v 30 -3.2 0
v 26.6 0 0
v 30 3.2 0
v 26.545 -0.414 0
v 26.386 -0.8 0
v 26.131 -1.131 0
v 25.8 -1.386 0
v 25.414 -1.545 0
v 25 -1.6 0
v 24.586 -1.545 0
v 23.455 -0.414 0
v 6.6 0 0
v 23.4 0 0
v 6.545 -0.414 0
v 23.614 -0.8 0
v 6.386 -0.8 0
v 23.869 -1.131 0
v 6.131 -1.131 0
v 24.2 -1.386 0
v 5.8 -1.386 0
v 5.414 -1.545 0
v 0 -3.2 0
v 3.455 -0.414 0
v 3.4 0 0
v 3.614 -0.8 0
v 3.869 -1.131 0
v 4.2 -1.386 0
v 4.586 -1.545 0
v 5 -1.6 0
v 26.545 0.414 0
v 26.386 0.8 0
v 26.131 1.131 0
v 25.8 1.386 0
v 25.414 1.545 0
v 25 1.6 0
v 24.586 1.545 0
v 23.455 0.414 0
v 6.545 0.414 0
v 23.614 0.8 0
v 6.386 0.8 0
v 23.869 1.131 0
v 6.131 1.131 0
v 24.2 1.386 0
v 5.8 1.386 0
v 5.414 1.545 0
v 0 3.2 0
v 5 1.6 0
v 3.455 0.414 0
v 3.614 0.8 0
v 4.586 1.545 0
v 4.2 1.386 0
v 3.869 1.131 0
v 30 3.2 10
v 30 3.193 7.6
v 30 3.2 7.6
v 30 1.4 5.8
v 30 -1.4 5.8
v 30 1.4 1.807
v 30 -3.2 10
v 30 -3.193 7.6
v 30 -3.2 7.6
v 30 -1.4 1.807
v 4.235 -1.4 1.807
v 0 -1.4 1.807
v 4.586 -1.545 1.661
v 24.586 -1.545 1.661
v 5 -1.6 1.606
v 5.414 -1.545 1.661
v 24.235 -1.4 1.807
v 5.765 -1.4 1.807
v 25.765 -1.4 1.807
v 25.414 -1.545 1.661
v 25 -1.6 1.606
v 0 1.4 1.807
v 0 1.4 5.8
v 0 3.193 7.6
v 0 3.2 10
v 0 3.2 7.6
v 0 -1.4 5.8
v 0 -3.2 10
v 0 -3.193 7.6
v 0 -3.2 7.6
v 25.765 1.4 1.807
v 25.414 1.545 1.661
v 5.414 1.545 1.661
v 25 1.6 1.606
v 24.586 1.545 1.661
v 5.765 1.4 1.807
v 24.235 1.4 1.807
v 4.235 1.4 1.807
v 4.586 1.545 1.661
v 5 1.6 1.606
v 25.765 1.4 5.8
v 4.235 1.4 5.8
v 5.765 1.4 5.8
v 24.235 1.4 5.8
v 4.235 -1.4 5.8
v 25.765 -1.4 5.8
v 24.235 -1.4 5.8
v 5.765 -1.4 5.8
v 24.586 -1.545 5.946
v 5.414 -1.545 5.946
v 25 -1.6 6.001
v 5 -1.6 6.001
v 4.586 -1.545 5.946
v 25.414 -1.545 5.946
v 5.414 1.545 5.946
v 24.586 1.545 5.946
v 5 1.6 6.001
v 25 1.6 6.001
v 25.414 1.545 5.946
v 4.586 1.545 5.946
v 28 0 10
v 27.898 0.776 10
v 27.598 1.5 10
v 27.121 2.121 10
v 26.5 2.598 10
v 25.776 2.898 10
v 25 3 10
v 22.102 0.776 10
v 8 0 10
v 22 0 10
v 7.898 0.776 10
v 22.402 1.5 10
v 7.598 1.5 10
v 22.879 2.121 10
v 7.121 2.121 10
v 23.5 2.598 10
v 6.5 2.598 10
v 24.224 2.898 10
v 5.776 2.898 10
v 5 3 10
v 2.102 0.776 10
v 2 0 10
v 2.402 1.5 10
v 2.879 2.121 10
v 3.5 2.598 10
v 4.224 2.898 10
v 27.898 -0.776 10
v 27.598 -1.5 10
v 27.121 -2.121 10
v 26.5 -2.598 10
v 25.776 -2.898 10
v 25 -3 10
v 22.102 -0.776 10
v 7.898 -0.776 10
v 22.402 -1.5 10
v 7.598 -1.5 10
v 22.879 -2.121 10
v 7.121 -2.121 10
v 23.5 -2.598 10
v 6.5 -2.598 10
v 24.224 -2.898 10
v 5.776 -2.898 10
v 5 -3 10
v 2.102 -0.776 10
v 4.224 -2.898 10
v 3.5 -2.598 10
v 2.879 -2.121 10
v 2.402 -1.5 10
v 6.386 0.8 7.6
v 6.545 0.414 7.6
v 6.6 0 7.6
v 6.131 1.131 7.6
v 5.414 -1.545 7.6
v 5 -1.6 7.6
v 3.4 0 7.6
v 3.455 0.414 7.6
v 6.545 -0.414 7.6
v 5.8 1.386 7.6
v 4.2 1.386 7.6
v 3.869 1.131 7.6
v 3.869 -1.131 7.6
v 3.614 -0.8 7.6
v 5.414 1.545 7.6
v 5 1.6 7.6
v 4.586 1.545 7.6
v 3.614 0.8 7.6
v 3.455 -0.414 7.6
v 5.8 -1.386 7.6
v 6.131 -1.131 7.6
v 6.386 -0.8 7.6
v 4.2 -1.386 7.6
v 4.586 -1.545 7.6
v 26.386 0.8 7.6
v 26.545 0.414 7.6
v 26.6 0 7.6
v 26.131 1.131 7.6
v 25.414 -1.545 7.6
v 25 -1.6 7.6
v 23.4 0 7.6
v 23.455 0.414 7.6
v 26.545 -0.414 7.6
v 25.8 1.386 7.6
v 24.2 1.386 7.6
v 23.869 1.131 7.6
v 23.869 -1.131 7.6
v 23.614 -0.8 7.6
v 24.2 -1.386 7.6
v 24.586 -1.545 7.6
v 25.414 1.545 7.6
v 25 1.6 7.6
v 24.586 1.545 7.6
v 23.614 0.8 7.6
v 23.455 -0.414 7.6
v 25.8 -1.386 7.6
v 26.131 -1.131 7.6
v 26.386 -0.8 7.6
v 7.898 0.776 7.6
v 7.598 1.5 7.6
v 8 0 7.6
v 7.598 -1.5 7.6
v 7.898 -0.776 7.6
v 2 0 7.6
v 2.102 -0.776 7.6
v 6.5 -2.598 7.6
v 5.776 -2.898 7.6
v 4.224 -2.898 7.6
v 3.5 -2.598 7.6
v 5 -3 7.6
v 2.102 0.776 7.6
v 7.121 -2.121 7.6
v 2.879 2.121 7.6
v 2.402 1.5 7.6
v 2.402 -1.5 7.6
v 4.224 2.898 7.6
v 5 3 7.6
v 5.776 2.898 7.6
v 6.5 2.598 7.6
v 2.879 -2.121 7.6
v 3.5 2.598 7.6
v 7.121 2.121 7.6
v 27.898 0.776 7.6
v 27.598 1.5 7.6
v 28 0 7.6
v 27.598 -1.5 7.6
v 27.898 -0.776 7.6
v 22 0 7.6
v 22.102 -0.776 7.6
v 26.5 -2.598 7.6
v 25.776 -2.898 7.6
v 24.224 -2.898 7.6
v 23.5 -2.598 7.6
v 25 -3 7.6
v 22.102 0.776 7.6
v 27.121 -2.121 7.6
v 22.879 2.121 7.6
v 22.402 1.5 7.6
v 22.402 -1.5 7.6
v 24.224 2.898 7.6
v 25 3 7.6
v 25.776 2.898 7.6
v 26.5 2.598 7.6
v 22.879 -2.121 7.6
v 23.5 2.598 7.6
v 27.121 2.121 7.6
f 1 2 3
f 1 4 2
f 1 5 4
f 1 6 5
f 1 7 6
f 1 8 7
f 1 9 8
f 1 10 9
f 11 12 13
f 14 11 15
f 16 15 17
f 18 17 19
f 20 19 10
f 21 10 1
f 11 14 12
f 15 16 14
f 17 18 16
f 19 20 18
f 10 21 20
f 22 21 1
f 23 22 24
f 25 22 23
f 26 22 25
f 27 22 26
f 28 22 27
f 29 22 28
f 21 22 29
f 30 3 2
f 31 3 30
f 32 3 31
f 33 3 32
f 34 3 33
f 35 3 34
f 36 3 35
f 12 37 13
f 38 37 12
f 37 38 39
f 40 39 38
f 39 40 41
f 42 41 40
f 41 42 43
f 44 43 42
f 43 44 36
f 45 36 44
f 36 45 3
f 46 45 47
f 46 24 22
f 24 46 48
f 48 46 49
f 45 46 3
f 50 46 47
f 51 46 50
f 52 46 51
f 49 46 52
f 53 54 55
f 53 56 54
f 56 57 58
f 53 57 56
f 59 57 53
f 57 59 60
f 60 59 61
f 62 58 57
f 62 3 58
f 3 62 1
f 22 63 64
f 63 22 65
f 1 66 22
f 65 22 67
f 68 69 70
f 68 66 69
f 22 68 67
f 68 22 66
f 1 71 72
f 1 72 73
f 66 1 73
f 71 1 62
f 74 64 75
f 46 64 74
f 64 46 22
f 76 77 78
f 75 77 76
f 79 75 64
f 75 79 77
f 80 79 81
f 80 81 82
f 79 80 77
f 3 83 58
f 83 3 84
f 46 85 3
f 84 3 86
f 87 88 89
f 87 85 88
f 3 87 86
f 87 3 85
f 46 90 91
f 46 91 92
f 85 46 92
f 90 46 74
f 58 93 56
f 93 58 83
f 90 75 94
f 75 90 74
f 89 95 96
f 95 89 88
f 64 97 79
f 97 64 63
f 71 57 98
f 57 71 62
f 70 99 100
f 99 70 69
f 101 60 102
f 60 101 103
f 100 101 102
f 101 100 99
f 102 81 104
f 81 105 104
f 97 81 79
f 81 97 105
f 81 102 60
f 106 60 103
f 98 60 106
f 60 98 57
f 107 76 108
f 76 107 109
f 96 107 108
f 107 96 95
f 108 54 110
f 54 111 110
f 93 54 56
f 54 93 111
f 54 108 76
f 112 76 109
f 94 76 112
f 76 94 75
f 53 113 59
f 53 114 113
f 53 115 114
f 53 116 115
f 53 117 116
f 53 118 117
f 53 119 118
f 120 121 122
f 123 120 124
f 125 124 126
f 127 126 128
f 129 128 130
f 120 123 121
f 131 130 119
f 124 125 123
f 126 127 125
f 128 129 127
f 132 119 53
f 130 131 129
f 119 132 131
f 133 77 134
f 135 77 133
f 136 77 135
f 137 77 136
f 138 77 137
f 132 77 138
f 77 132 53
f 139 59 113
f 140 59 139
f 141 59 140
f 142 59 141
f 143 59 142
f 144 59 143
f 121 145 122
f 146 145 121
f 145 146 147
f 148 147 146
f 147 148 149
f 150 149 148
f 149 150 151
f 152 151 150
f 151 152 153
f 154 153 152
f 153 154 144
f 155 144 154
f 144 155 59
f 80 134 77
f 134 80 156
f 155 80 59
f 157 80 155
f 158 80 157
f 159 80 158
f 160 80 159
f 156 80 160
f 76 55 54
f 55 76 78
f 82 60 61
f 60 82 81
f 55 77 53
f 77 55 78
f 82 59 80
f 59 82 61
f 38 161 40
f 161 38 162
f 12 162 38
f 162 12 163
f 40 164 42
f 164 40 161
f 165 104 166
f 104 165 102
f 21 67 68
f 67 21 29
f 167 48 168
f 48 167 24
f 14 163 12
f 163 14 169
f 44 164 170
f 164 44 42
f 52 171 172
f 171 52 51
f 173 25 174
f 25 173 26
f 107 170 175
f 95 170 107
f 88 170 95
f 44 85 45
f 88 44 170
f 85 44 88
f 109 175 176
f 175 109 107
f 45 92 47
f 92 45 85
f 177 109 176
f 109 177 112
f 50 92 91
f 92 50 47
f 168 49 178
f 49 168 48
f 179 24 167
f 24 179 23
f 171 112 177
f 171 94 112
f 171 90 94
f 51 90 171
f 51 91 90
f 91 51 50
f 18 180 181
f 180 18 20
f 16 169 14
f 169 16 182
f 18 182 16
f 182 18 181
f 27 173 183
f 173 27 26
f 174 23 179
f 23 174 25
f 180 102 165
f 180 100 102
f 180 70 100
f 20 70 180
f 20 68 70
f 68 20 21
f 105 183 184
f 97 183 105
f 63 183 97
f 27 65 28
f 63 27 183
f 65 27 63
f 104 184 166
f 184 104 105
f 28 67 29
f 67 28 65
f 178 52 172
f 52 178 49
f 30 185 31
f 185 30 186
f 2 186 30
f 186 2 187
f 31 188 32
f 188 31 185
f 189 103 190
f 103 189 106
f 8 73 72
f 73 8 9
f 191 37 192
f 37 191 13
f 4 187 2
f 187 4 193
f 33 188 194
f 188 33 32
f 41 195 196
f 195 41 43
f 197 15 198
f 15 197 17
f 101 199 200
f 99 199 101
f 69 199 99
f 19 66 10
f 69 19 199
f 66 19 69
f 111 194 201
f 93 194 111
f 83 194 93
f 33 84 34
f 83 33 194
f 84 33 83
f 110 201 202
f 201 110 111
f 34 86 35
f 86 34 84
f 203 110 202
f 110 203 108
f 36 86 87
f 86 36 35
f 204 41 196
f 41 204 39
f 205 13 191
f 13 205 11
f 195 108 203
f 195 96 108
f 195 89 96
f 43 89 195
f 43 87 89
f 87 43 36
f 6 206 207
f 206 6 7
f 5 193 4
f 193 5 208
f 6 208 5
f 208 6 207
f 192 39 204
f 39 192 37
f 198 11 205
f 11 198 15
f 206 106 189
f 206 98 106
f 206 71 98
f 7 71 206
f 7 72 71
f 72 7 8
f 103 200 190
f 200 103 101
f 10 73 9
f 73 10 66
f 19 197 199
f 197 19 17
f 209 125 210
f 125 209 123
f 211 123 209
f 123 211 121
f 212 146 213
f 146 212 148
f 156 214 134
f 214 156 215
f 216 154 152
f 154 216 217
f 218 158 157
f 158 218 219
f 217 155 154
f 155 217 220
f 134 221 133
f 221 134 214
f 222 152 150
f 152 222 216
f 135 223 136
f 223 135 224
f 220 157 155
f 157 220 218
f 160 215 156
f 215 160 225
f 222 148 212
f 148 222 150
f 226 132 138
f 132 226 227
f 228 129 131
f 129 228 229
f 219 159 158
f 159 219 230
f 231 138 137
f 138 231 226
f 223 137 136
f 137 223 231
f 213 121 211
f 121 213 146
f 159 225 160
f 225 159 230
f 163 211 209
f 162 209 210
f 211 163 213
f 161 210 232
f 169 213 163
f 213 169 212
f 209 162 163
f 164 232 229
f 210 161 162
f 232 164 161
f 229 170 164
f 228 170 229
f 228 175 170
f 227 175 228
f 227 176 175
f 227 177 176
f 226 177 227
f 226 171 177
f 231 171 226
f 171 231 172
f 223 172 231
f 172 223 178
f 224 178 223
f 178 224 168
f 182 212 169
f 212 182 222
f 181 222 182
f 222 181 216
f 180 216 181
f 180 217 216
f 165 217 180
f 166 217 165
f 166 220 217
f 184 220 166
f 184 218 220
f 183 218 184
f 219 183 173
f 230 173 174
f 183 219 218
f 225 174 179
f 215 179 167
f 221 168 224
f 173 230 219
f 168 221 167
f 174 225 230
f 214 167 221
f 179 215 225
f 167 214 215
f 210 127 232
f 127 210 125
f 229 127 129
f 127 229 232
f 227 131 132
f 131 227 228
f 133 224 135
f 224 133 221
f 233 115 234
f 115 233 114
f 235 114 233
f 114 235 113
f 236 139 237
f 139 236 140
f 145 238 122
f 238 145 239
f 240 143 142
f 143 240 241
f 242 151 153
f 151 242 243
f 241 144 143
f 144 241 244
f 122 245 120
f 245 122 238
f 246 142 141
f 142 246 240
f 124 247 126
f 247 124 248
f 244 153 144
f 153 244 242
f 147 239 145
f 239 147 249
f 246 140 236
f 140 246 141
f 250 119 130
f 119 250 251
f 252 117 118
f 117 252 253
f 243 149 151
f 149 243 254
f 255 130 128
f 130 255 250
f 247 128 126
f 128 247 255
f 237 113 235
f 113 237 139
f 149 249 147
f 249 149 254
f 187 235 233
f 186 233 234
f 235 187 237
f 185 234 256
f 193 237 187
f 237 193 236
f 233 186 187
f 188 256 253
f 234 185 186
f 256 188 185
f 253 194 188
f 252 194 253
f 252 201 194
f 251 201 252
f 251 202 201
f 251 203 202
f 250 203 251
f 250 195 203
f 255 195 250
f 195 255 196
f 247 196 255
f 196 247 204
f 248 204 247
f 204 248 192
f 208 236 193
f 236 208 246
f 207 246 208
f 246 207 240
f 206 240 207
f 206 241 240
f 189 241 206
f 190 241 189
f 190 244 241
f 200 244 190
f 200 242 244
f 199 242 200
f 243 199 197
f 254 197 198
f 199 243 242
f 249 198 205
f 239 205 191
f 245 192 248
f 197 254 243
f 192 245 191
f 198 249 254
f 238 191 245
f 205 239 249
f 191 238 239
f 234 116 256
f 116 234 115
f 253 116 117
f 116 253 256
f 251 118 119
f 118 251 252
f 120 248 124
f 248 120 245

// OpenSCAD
// file: basic_shapes.scad
module hole_array(xs, diameter, height, y = 0, z = 0) {
    for (x = xs) {
        translate([x, y, z]) {
            cylinder(
                d = diameter,
                h = height
            );
        }
    }
}

module flat_top_rectangular_pyramid(
    top_width = 0,
    top_length = 0,

    bottom_width = 0,
    bottom_length = 0,

    height = 0,

    top_x = undef,
    top_y = undef,

    top_weight_x = .5,
    top_weight_y = .5
) {
    top_x = top_x != undef
        ? top_x
        : (bottom_width - top_width) * top_weight_x;
    top_y = top_y != undef
        ? top_y
        : (bottom_length - top_length) * top_weight_y;

    max_difference = max(bottom_width - top_width, bottom_length - top_length);
    height = height == undef
        ? max_difference / 2
        : height;

    polyhedron(
        [
            [0, 0, 0],
            [bottom_width, 0, 0],
            [bottom_width, bottom_length, 0],
            [0, bottom_length, 0],
            [top_x, top_y, height],
            [top_width + top_x, top_y, height],
            [top_width + top_x, top_length + top_y, height],
            [top_x, top_length + top_y, height]
        ], [
            [0, 1, 2, 3],
            [4, 5, 1, 0],
            [7, 6, 5, 4],
            [5, 6, 2, 1],
            [6, 7, 3, 2],
            [7, 4, 0, 3]
        ]
    );
}

module rounded_cube(dimensions, radius, $fn = $fn) {
    positions = [
        [radius, radius, radius],
        [dimensions.x - radius, radius, radius],
        [dimensions.x - radius, dimensions.y - radius, radius],
        [radius, dimensions.y - radius, radius],
        [radius, radius, dimensions.z - radius],
        [dimensions.x - radius, radius, dimensions.z - radius],
        [dimensions.x - radius, dimensions.y - radius, dimensions.z - radius],
        [radius, dimensions.y - radius, dimensions.z - radius],
    ];

    if (radius > 0) {
        hull() {
            for (position = positions) {
                translate(position) sphere(r = radius);
            }
        }
    } else {
        cube(dimensions);
    }
}

module support_wall(
    dimensions,
    is_back = true,
    railing_diameter = 3.5,
    support_width = 2,
    support_length = 4,
    gutter = 4
) {
    railing_z = railing_diameter / 4;

    module _support(height = dimensions[2], depth = support_length) {
        translate([0, -depth, 0]) {
            flat_top_rectangular_pyramid(
                top_width = support_width,
                top_length = 0,
                bottom_width = support_width,
                bottom_length = support_length,
                height = height,
                top_weight_y = 1
            );
        }
    }

    translate(is_back ? [0, dimensions[1], 0] : [0, 0, 0]) {
        mirror(is_back ? [0, 1, 0] : [0, 0, 0]) {
            cube(dimensions);

            translate([0, dimensions[1] / 2, dimensions[2] + railing_z]) {
                rotate([0, 90, 0]) {
                    cylinder(
                        d = railing_diameter,
                        h = dimensions[0],
                        $fn = 9
                    );
                }
            }

            translate([gutter, 0, 0]) {
                _support();
            }
            translate([dimensions[0] - support_length - gutter, 0, 0]) {
                _support();
            }
        }
    }
}
// file: values.scad
DEFAULT_ROUNDING = 24;
HIDEF_ROUNDING = 120;

SACRIFICIAL_BRIDGE_HEIGHT = .2;
BREAKAWAY_SUPPORT_DEPTH = .2;

PCB_WIDTH = 181.356;
PCB_LENGTH = 127.254;
PCB_HEIGHT = 1.6;
PCB_MOUNT_HOLE_DIAMETER = 3.2;

PCB_BATTERY_CAVITY_X = 147.828;
PCB_BATTERY_CAVITY_Y = PCB_LENGTH - 94.234;
PCB_BATTERY_CAVITY_LENGTH = 66.8;

PCB_COMPONENTS_X = 2.126;
PCB_COMPONENTS_Y = 38.1;
PCB_COMPONENTS_WIDTH = PCB_WIDTH - PCB_COMPONENTS_X * 2;
PCB_COMPONENTS_LENGTH = PCB_LENGTH - PCB_COMPONENTS_Y - 1.78;
PCB_COMPONENTS_HEIGHT = 12;

BUTTON_DIAMETER = 6;
BUTTON_LENGTH = 6.6;
BUTTON_WIDTH = 4.5;
BUTTON_HEIGHT = 6;

PCB_HOLES = [
    [6.64, PCB_LENGTH - 122.682],
    [62.52, PCB_LENGTH - 122.682],
    [118.4, PCB_LENGTH - 122.682],
    [174.28, PCB_LENGTH - 122.682],

    [6.64, PCB_LENGTH - 97.79],
    [62.52, PCB_LENGTH - 97.79],
    [118.4, PCB_LENGTH - 97.79],
    [174.28, PCB_LENGTH - 97.79],

    [3.302, PCB_LENGTH - 22.098],
    [178.054, PCB_LENGTH - 3.302],
];

PCB_BUTTONS = [
    [8.89, PCB_LENGTH - BUTTON_LENGTH - 111.506],
    [16.51, PCB_LENGTH - BUTTON_LENGTH - 106.426],
    [24.13, PCB_LENGTH - BUTTON_LENGTH - 111.506],
    [31.75, PCB_LENGTH - BUTTON_LENGTH - 106.426],
    [39.37, PCB_LENGTH - BUTTON_LENGTH - 111.506],
    [46.99, PCB_LENGTH - BUTTON_LENGTH - 106.426],
    [54.61, PCB_LENGTH - BUTTON_LENGTH - 111.506],
    [69.85, PCB_LENGTH - BUTTON_LENGTH - 111.506],
    [77.47, PCB_LENGTH - BUTTON_LENGTH - 106.426],
    [85.09, PCB_LENGTH - BUTTON_LENGTH - 111.506],
    [92.71, PCB_LENGTH - BUTTON_LENGTH - 106.426],
    [100.33, PCB_LENGTH - BUTTON_LENGTH - 111.506],
    [115.57, PCB_LENGTH - BUTTON_LENGTH - 111.506],
    [123.19, PCB_LENGTH - BUTTON_LENGTH - 106.426],
    [130.81, PCB_LENGTH - BUTTON_LENGTH - 111.506],
    [138.43, PCB_LENGTH - BUTTON_LENGTH - 106.426],
    [146.05, PCB_LENGTH - BUTTON_LENGTH - 111.506],
    [153.67, PCB_LENGTH - BUTTON_LENGTH - 106.426],
    [161.29, PCB_LENGTH - BUTTON_LENGTH - 111.506],
    [176.53, PCB_LENGTH - BUTTON_LENGTH - 111.506],
];

PCB_VOLUME_WHEEL_X = 177.271969;
PCB_VOLUME_WHEEL_Y = PCB_LENGTH - 20.828;

SCREW_HEAD_DIAMETER = 6;
SCREW_HEAD_HEIGHT = 2.2;
NUT_DIAMETER = 6.4;
NUT_HEIGHT = 2.6;

MOUNT_STILT_MINIMUM_HEIGHT = NUT_HEIGHT + .5 + 2; // TODO: tidy against mount_stilt args

NATURAL_KEY_SEQUENCES = [
    [1,0,1,0,1,1,0,1,0,1,0,1,],
    [0,1,0,1,1,0,1,0,1,0,1,1,],
    [1,0,1,1,0,1,0,1,0,1,1,0,],
    [0,1,1,0,1,0,1,0,1,1,0,1,],
    [1,1,0,1,0,1,0,1,1,0,1,0,],
    [1,0,1,0,1,0,1,1,0,1,0,1,],
    [0,1,0,1,0,1,1,0,1,0,1,1,],
    [1,0,1,0,1,1,0,1,0,1,1,0,],
    [0,1,0,1,1,0,1,0,1,1,0,1,],
    [1,0,1,1,0,1,0,1,1,0,1,0,],
    [0,1,1,0,1,0,1,1,0,1,0,1,],
    [1,1,0,1,0,1,1,0,1,0,1,0,],
];

HINGE_CLASP_DEFAULT_PIN_DIAMETER = 1.75; // filament diameter
HINGE_CLASP_DEFAULT_MINIMAL_SUPPORT = 1.5;
HINGE_CLASP_MINIMUM_TOOTH_WIDTH = 5;
HINGE_CLASP_MINIMUM_TOOTH_COUNT = 5;
HINGE_CLASP_MINIMUM_WIDTH = HINGE_CLASP_MINIMUM_TOOTH_WIDTH
    * HINGE_CLASP_MINIMUM_TOOTH_COUNT;
MINIMUM_HINGE_CLASP_LENGTH = 20;

HINGE_CLASP_SIDE_FRONT_BACK = 0;
HINGE_CLASP_SIDE_LEFT_RIGHT = 1;

LIP_BOX_DEFAULT_LIP_HEIGHT = 3;

BATTERY_WIDTH = 27.5;
BATTERY_LENGTH = 51;
BATTERY_HEIGHT = 16.5;
BATTERY_SNAP_LENGTH = 5;

/* AZ40R https://www.jameco.com/Jameco/Products/ProdDS/2227516.pdf */
SPEAKER_DIAMETER = 40;
SPEAKER_HEIGHT = 5;
SPEAKER_CLEARANCE = 2;

/* C&K PVA2EEH21.7N
https://www.jameco.com/z/PVA2EEH21-7N-C-K-32-Volt-1-AMP-DOUBLE-POLE-DOUBLE-THROW-DPDT-ON-ON-SHORT-STROKE-PUSHBUTTON-SWITCH-PVA2EEH21-7N-C-K_594718.html */
SWITCH_BASE_WIDTH = 8.6;
SWITCH_BASE_LENGTH = 8.6;
SWITCH_BASE_HEIGHT = 8.6;
SWITCH_ACTUATOR_WIDTH = 3;
SWITCH_ACTUATOR_LENGTH = 2;
SWITCH_ACTUATOR_HEIGHT = 5.6;
SWITCH_ACTUATOR_TRAVEL = 1.5;
SWITCH_ORIGIN = [0, 0];

PENCIL_STAND_CAVITY_DIAMETER = 8.5;

WINDOW_PANE_HEIGHT = 25.4 * 1 / 8;
// main file
include <values.scad>;

use <basic_shapes.scad>;

module hitch(
    width,
    height,

    head_bleed = 0,
    y_bleed = 0,

    mount_hole_xs = [],

    mount_hole_diameter = PCB_MOUNT_HOLE_DIAMETER,
    mount_screw_head_diameter = SCREW_HEAD_DIAMETER,
    mount_screw_head_height = SCREW_HEAD_HEIGHT,
    mount_screw_head_clearance = .2,

    $fn = DEFAULT_ROUNDING
) {
    e = 0.007;
    minimum_wall = .2;

    head_length = mount_screw_head_diameter + minimum_wall * 2 + y_bleed * 2;
    head_height = mount_screw_head_height + mount_screw_head_clearance
        + head_bleed;
    arm_length = mount_hole_diameter - minimum_wall * 2 + y_bleed * 2;
    chamfer_height = (head_length - arm_length) / 2;
    arm_height = height - head_height + head_bleed - chamfer_height * 2;

    module _mount_holes() {
        hole_array(
            mount_hole_xs,
            mount_hole_diameter,
            height + e * 2,
            0,
            -e
        );
        hole_array(
            mount_hole_xs,
            mount_screw_head_diameter,
            head_height + e,
            0,
            height - head_height + head_bleed
        );
    }

    module _arm() {
        translate([0, arm_length / -2, chamfer_height]) {
            cube([width, arm_length, arm_height + e]);
        }
    }

    module _chamfer(top_length, bottom_length, z) {
        translate([0, bottom_length / -2, z]) {
            flat_top_rectangular_pyramid(
                top_width = width,
                top_length = top_length,
                bottom_width = width,
                bottom_length = bottom_length,
                height = chamfer_height + e
            );
        }
    }

    module _head() {
        translate([0, head_length / -2, arm_height + chamfer_height * 2]) {
            cube([width, head_length, head_height]);
        }
    }

    difference() {
        union() {
            _chamfer(arm_length, head_length, 0);
            _arm();
            _chamfer(head_length, arm_length, chamfer_height + arm_height);
            _head();
        }

        _mount_holes();
    }
}

hitch(
    width = 30,
    height = 10,

    head_bleed = 0,
    y_bleed = 0,

    mount_hole_xs = [5, 25],

    mount_hole_diameter = PCB_MOUNT_HOLE_DIAMETER,
    mount_screw_head_diameter = SCREW_HEAD_DIAMETER,
    mount_screw_head_height = SCREW_HEAD_HEIGHT,
    mount_screw_head_clearance = .2
);
